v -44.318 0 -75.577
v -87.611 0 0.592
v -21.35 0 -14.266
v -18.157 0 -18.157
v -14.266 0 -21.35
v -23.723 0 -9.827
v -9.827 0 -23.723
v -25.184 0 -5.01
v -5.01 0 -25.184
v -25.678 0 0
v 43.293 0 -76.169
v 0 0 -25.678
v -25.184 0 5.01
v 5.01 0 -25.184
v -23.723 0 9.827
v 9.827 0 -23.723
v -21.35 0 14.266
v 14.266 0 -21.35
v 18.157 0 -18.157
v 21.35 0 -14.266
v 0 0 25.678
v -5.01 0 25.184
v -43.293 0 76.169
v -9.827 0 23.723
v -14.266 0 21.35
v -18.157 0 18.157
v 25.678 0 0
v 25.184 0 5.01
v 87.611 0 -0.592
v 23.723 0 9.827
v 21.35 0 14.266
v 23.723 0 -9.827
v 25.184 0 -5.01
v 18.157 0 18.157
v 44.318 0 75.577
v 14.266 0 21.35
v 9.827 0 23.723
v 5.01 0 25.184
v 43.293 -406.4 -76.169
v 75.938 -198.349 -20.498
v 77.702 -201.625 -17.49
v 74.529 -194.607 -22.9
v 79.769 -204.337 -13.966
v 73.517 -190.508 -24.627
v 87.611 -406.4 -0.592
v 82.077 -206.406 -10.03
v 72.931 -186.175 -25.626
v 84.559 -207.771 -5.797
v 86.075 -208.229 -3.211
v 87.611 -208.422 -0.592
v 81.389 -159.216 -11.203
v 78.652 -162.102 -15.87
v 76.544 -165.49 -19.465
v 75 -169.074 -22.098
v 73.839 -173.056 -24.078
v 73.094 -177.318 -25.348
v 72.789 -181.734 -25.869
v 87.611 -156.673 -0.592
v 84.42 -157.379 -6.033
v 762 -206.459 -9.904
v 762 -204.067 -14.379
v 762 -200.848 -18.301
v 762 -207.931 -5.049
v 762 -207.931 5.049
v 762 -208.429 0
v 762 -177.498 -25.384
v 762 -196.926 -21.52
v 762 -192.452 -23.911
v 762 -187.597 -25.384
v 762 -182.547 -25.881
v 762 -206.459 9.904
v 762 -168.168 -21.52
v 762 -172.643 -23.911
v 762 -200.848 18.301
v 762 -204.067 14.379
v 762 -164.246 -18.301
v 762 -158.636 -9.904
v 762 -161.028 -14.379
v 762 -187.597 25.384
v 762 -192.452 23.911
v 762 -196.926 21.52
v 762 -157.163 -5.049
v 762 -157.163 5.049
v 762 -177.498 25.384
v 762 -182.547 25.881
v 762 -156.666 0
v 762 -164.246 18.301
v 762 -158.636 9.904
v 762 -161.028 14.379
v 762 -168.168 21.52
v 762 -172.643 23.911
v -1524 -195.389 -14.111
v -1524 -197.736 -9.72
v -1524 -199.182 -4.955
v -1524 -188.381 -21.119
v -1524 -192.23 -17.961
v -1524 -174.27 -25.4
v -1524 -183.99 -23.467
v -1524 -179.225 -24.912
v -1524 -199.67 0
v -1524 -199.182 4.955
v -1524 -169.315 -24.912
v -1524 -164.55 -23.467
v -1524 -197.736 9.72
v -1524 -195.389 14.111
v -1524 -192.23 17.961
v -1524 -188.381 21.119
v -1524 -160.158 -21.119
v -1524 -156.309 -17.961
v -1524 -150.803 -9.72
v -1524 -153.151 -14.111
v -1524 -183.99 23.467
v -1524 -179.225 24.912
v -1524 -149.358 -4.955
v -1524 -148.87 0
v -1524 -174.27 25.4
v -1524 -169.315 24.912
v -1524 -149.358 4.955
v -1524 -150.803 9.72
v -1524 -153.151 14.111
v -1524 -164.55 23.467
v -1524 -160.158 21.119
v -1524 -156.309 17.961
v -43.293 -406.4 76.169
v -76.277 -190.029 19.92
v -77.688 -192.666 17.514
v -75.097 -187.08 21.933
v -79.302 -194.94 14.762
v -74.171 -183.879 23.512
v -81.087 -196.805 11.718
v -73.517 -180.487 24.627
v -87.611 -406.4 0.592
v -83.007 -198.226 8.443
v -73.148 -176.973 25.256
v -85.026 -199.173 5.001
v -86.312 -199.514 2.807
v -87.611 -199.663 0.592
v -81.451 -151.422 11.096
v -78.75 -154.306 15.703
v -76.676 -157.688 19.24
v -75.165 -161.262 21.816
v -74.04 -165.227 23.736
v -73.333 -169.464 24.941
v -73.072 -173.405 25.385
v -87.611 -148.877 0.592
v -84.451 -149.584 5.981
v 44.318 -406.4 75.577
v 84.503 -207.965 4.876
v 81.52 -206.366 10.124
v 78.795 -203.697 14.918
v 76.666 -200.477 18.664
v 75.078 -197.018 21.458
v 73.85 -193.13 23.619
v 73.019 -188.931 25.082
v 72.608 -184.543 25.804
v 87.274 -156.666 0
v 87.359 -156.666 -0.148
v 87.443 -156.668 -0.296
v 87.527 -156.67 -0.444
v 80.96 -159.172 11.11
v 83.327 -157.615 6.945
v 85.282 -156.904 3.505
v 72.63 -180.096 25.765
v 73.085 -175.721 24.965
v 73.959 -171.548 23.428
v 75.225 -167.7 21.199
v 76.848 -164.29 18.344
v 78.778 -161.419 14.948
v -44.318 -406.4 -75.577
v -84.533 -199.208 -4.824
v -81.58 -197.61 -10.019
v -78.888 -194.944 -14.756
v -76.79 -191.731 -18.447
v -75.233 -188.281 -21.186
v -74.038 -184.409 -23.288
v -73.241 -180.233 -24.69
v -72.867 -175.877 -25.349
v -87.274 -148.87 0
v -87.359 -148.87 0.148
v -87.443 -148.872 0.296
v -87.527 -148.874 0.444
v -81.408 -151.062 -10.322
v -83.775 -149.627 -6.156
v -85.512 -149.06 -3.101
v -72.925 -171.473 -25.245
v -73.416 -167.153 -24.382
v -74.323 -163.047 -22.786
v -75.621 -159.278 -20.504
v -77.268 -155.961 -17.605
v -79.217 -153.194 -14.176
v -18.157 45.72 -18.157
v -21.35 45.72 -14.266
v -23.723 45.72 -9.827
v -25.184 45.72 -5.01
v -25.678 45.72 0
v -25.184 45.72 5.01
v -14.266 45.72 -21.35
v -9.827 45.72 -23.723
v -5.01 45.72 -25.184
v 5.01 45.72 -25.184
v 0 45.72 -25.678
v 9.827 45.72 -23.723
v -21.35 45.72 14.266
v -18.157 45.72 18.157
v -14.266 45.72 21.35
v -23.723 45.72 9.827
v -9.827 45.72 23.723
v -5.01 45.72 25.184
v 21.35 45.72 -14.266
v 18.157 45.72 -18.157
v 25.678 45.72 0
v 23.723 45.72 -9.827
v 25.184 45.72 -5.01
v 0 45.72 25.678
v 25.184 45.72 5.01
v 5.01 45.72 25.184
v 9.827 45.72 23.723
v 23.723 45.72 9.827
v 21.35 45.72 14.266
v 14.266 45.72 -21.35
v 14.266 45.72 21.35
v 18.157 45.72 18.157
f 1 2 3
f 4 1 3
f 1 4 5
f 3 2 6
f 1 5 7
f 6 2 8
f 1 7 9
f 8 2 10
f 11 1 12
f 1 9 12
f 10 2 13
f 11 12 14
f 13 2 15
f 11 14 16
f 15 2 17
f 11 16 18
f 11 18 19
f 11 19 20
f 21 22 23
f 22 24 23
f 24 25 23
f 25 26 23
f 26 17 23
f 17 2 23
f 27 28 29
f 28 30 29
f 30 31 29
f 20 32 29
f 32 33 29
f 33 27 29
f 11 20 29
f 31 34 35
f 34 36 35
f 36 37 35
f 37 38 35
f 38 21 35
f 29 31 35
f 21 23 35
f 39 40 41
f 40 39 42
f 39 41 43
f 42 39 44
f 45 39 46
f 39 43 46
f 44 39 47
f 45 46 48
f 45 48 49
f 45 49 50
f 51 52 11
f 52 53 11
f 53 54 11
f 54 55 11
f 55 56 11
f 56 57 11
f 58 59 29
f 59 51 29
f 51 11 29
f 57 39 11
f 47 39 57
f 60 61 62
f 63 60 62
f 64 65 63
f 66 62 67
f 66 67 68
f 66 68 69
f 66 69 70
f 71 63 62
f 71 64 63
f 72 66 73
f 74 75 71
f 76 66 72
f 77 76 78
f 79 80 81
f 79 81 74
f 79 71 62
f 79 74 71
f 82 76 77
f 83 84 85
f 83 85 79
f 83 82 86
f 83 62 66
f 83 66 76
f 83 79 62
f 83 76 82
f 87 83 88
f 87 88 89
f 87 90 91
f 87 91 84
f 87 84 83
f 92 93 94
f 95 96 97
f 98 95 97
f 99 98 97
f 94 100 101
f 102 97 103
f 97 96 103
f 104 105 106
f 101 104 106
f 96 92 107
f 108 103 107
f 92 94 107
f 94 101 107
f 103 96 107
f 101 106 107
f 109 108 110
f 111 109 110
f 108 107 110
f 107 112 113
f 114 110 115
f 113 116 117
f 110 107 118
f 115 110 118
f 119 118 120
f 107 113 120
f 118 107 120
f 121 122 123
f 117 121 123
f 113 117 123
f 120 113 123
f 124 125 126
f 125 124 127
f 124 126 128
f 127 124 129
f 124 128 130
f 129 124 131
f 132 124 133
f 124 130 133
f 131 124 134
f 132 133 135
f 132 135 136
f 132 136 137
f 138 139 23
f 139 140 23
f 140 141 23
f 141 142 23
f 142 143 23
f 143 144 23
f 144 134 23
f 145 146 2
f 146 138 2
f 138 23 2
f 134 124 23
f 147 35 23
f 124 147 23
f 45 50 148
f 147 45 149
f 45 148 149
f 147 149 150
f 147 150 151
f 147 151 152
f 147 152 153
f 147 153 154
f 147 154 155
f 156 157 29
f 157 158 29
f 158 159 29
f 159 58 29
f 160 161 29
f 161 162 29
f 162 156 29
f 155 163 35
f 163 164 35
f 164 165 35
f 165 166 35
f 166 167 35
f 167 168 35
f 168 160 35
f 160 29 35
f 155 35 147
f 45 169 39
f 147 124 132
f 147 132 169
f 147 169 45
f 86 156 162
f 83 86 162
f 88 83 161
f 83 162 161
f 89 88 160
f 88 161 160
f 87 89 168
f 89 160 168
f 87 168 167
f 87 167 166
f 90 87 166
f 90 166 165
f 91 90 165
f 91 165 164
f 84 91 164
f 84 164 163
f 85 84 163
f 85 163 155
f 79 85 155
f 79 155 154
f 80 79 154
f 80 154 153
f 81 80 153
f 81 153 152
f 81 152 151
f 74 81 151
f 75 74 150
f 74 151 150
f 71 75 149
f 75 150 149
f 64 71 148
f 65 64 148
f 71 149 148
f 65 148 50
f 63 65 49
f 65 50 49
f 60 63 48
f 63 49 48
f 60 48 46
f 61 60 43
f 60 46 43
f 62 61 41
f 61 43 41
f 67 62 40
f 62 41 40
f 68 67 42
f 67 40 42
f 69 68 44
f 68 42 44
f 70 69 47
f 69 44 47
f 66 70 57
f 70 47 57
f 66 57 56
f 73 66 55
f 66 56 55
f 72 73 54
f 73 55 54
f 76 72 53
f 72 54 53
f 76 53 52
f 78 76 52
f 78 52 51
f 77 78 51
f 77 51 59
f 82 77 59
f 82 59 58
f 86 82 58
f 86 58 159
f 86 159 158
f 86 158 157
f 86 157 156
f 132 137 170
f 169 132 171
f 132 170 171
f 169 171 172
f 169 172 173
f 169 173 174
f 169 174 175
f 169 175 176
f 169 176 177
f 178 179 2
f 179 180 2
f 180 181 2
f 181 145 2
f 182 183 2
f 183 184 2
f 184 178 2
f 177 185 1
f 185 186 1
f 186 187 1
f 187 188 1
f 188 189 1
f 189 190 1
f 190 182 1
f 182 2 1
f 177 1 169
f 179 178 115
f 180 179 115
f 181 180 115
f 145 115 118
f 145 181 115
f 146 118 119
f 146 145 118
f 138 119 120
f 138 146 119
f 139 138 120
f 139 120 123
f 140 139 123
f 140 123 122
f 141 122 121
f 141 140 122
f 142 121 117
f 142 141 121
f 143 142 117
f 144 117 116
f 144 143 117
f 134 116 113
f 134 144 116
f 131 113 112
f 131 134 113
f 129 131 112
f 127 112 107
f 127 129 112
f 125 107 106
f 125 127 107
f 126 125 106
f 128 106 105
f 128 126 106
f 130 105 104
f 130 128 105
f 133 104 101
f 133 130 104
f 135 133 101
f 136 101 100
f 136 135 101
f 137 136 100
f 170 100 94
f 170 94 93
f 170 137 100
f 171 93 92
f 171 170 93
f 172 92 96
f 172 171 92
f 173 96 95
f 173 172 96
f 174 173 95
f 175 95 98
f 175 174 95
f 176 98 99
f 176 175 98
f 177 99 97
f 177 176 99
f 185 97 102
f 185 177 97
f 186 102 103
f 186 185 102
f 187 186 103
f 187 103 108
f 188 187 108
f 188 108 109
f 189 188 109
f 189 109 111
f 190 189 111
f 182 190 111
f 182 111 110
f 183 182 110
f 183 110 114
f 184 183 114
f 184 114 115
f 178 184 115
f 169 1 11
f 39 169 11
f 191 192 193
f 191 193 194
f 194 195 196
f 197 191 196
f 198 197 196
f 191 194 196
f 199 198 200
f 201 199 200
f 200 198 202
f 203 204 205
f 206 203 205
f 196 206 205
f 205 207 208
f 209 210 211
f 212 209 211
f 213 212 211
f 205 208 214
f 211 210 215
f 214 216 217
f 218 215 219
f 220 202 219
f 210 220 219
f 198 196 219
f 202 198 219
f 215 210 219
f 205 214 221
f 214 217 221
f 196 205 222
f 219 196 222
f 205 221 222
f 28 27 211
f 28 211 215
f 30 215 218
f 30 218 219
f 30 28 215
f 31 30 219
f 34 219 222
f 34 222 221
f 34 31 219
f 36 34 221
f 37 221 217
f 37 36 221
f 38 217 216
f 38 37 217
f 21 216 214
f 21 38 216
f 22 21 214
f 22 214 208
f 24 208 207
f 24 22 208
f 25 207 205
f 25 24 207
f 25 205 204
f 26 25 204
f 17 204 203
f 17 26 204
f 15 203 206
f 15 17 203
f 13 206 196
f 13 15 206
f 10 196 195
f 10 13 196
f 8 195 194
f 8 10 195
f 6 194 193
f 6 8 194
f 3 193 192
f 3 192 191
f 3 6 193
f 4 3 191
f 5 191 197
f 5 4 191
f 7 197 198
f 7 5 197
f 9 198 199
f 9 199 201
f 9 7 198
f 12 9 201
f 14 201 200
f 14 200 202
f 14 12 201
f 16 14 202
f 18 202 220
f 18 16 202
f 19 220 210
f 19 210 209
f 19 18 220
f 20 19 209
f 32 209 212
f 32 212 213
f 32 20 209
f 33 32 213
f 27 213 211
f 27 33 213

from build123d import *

# Parameters (mm, degrees)
F1_DEPTH = 406.4
F2_R     = 25.88143
F3_DEPTH = 762
F4_R     = 25.4
F5_DEPTH = 1524
F6_R     = 25.67789
F7_DEPTH = 45.72


with BuildPart() as f1:
    # F0 (on Front) → F1 (new body)
    with BuildSketch(Plane.XZ):
        Polygon((43.292664, -76.169349), (87.610923, -0.592128), (44.318259, 75.577221), (-43.292664, 76.169349), (-87.610923, 0.592128), (-44.318259, -75.577221), align=None)
    extrude(amount=F1_DEPTH)

    # F2 (on Right) → F3 (join)
    with BuildSketch(Plane.YZ):
        with Locations((-182.547286, 0)):
            Circle(F2_R)
    extrude(amount=F3_DEPTH)

    # F4 (on Right) → F5 (join)
    with BuildSketch(Plane.YZ):
        with Locations((-174.269957, 0)):
            Circle(F4_R)
    extrude(amount=-F5_DEPTH)

    # F6 (on Front) → F7 (join)
    with BuildSketch(Plane.XZ):
        Circle(F6_R)
    extrude(amount=-F7_DEPTH)


solid = f1.part
